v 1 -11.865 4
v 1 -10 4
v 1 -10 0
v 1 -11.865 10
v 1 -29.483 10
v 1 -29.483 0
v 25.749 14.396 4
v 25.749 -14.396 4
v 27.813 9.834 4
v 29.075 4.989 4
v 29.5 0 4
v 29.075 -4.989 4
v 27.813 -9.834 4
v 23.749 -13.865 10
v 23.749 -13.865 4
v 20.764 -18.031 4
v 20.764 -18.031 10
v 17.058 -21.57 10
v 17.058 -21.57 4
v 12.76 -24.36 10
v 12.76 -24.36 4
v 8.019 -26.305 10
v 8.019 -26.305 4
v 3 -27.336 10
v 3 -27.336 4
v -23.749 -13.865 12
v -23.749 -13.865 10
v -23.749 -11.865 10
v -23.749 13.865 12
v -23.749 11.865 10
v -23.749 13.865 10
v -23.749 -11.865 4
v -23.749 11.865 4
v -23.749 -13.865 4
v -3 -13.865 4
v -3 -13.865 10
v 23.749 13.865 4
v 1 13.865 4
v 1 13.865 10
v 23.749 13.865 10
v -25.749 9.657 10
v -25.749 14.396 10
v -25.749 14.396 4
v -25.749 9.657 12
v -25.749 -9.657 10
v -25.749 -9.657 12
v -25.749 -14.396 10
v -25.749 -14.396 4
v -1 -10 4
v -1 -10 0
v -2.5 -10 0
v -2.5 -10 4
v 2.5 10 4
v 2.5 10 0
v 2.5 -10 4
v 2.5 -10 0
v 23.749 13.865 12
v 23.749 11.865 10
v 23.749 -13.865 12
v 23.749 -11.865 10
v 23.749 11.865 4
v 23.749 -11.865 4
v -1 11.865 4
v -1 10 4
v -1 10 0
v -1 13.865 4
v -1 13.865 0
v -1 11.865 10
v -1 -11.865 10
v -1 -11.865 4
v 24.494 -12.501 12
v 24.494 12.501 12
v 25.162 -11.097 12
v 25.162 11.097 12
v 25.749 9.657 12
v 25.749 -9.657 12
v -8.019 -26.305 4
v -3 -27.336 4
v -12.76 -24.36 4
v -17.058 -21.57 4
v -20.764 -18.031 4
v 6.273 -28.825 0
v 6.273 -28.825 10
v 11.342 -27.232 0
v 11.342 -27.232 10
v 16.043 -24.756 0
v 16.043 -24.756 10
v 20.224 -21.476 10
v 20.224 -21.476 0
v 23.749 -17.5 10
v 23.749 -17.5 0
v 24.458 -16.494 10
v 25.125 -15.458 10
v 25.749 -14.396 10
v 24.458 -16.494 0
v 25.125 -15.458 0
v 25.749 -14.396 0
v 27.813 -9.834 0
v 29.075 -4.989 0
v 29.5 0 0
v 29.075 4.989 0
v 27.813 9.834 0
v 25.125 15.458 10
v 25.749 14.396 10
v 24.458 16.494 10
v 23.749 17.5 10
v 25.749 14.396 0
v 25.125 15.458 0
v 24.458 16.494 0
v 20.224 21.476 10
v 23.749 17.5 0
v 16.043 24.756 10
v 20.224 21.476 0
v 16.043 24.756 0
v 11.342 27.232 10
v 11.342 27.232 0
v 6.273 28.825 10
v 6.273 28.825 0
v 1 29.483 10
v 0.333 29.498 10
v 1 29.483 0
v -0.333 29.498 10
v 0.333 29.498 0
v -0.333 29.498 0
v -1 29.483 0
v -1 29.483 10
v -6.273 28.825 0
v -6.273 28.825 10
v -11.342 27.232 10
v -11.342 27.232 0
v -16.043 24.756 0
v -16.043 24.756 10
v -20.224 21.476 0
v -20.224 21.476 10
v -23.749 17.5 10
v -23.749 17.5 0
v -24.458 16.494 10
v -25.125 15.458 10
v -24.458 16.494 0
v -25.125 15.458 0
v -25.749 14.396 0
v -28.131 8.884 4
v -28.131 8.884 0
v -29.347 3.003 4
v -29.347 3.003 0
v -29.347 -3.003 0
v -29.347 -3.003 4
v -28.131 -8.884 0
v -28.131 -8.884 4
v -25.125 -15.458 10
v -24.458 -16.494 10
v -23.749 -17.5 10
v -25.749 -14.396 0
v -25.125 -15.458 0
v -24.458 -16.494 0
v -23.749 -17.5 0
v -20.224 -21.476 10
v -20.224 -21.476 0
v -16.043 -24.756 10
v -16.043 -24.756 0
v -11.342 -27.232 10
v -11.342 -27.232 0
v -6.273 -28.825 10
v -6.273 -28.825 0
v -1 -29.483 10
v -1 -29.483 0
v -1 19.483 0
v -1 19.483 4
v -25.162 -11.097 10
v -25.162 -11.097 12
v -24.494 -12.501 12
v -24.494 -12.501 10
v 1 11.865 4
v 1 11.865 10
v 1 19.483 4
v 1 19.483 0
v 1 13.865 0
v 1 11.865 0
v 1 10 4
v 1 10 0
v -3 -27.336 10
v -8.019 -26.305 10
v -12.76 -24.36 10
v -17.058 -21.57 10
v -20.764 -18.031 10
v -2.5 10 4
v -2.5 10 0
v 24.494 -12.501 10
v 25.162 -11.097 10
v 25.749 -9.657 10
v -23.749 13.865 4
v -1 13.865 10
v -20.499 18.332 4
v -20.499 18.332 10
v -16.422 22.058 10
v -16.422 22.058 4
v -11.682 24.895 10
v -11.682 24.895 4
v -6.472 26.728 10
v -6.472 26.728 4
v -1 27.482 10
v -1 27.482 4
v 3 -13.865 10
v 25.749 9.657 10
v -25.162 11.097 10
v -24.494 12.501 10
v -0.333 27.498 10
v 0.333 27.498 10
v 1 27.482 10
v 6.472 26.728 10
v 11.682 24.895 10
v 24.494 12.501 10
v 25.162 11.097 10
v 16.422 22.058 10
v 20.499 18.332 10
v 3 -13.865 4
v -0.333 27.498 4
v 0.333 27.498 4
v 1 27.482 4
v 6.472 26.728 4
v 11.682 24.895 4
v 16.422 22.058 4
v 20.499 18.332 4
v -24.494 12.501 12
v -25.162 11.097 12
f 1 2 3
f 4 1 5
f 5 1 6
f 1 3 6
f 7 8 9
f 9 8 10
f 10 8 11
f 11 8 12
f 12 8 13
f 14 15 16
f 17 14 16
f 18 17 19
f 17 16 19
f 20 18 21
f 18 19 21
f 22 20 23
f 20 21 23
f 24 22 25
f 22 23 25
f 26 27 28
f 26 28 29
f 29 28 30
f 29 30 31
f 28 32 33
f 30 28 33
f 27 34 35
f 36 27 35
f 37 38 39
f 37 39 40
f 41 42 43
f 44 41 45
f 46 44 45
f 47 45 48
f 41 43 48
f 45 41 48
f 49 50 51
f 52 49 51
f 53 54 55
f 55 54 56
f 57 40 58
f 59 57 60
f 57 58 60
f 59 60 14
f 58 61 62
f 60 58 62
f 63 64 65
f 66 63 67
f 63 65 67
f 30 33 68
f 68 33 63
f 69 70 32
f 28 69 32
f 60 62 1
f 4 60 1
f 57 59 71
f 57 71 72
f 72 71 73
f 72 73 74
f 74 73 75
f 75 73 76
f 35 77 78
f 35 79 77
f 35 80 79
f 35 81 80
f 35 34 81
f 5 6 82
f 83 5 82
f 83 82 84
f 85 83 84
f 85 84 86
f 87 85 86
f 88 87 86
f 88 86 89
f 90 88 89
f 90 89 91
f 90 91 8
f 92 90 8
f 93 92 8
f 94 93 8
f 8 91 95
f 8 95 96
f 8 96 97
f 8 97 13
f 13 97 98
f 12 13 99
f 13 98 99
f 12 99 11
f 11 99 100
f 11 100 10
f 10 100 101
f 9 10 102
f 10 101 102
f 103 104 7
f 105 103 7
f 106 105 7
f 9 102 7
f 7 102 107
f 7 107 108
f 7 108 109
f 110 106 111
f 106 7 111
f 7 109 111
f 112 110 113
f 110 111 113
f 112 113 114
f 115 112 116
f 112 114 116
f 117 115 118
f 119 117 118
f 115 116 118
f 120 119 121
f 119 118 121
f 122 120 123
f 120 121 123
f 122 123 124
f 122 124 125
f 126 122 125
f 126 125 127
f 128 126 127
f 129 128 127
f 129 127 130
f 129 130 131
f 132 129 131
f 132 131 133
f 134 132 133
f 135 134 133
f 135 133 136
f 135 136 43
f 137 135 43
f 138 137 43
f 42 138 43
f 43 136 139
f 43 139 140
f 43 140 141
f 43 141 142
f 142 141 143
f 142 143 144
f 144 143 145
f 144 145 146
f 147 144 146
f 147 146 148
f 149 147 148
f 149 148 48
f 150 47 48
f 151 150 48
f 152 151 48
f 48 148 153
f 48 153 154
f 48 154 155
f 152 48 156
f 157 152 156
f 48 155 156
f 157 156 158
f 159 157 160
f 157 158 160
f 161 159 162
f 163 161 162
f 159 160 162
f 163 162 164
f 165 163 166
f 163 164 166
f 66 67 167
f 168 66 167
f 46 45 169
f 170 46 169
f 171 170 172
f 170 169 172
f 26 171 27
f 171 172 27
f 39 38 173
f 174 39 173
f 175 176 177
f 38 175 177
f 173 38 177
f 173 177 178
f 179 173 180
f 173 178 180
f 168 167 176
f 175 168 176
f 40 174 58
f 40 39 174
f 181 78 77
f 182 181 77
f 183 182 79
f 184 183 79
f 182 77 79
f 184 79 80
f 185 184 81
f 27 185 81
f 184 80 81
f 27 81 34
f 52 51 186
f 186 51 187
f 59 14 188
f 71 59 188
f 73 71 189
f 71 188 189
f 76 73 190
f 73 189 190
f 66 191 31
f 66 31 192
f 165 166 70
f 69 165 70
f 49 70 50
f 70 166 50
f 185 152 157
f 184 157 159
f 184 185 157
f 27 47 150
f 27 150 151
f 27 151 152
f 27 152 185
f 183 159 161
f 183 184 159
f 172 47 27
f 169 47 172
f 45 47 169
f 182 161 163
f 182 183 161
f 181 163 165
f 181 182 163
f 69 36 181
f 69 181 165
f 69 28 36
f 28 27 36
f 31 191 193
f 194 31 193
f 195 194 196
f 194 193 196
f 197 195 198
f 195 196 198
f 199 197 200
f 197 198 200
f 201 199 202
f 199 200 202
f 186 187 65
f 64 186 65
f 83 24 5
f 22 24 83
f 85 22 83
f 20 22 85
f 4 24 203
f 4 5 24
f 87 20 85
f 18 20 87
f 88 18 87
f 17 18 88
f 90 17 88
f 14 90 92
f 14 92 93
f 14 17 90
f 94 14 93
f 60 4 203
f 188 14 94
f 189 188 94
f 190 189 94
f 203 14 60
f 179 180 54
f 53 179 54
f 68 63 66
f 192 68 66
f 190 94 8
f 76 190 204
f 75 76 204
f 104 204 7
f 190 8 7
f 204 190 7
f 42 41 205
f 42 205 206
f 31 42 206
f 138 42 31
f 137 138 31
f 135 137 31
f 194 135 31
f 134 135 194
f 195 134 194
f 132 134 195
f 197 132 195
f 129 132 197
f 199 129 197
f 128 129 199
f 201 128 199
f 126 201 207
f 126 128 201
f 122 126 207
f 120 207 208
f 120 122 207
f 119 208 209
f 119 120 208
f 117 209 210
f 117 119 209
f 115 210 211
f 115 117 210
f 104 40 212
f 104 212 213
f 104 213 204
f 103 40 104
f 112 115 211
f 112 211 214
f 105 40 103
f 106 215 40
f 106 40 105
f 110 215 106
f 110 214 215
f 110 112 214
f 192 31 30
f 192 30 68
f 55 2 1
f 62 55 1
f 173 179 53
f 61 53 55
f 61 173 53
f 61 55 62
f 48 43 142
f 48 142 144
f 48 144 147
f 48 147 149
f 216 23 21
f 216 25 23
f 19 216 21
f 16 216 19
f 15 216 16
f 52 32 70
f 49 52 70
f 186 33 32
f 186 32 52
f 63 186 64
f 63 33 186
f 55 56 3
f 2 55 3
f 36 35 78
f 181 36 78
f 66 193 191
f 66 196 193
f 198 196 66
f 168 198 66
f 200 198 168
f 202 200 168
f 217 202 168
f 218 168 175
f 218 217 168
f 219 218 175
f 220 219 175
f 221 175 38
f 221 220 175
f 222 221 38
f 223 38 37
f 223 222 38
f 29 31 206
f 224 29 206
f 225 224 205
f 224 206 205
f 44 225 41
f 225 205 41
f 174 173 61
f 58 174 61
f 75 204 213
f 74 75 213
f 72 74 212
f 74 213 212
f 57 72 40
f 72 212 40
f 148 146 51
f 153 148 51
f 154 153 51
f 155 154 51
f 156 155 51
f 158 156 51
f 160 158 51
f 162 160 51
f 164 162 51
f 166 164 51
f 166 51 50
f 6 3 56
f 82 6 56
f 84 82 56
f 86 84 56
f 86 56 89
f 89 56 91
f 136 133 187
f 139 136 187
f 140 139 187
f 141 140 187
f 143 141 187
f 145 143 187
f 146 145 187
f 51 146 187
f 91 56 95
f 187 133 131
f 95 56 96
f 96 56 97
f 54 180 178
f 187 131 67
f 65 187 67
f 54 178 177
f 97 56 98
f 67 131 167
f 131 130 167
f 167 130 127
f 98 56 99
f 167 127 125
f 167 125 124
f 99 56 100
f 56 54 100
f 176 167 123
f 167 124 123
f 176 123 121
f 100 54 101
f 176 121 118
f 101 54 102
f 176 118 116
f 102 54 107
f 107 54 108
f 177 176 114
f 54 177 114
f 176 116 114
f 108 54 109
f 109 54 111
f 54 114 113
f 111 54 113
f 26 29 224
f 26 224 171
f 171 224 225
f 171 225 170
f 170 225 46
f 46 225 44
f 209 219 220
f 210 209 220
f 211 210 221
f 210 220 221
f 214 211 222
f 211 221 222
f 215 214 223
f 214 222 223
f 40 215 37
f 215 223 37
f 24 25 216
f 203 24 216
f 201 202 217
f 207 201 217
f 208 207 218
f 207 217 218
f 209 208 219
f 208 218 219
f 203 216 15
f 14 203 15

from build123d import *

# Parameters (mm, degrees)
F0_W     = 22.7486841741
F0_H     = 2
F1_DEPTH = 4
F2_DEPTH = 12
F3_DEPTH = 10
F4_DEPTH = 10


with BuildPart() as f1:
    # F0 (on Top) → F1 (new body)
    with BuildSketch(Plane.XY):
        Polygon((-1, 10), (-1, 11.8654246239), (-23.7486841741, 11.8654246239), (-23.7486841741, -11.8654246239), (-1, -11.8654246239), (-1, -10), (-2.5, -10), (-2.5, 10), align=None)
        with BuildLine():
            Line((-23.7486841741, 11.8654246239), (-23.7486841741, 13.8654246239))
            ThreePointArc((-23.7486841741, 13.8654246239), (-24.8379817562, 11.8035868395), (-25.7486841741, 9.6568764776))
            Line((-25.7486841741, 9.6568764776), (-25.7486841741, -9.6568764776))
            ThreePointArc((-25.7486841741, -9.6568764776), (-24.8379817562, -11.8035868395), (-23.7486841741, -13.8654246239))
            Line((-23.7486841741, -13.8654246239), (-23.7486841741, -11.8654246239))
            Line((-23.7486841741, -11.8654246239), (-23.7486841741, 11.8654246239))
        make_face()
        with BuildLine():
            Line((-25.7486841741, -9.6568764776), (-25.7486841741, 9.6568764776))
            ThreePointArc((-25.7486841741, 9.6568764776), (-27.5, 0), (-25.7486841741, -9.6568764776))
        make_face()
        with BuildLine():
            Line((-25.7486841741, 9.6568764776), (-25.7486841741, 14.3963628498))
            ThreePointArc((-25.7486841741, 14.3963628498), (-29.5, 0), (-25.7486841741, -14.3963628498))
            Line((-25.7486841741, -14.3963628498), (-25.7486841741, -9.6568764776))
            ThreePointArc((-25.7486841741, -9.6568764776), (-27.5, 0), (-25.7486841741, 9.6568764776))
        make_face()
        with BuildLine():
            Line((-23.7486841741, 13.8654246239), (-23.7486841741, 17.5))
            ThreePointArc((-23.7486841741, 17.5), (-24.7972883445, 15.9795022063), (-25.7486841741, 14.3963628498))
            Line((-25.7486841741, 14.3963628498), (-25.7486841741, 9.6568764776))
            ThreePointArc((-25.7486841741, 9.6568764776), (-24.8379817562, 11.8035868395), (-23.7486841741, 13.8654246239))
        make_face()
        with BuildLine():
            Line((-1, 27.4818121673), (-1, 29.4830459756))
            ThreePointArc((-1, 29.4830459756), (-13.7485522802, 26.1003316109), (-23.7486841741, 17.5))
            Line((-23.7486841741, 17.5), (-23.7486841741, 13.8654246239))
            ThreePointArc((-23.7486841741, 13.8654246239), (-14.1235917712, 23.5960622876), (-1, 27.4818121673))
        make_face()
        with BuildLine():
            Line((-1, 19.4830459756), (-1, 27.4818121673))
            ThreePointArc((-1, 27.4818121673), (-14.1235917712, 23.5960622876), (-23.7486841741, 13.8654246239))
            Line((-23.7486841741, 13.8654246239), (-1, 13.8654246239))
            Line((-1, 13.8654246239), (-1, 19.4830459756))
        make_face()
        with Locations((-12.374342087, 12.8654246239)):
            Rectangle(F0_W, F0_H)
        with BuildLine():
            Line((23.7486841741, 13.8654246239), (23.7486841741, 17.5))
            ThreePointArc((23.7486841741, 17.5), (13.7485522802, 26.1003316109), (1, 29.4830459756))
            Line((1, 29.4830459756), (1, 27.4818121673))
            ThreePointArc((1, 27.4818121673), (14.1235917712, 23.5960622876), (23.7486841741, 13.8654246239))
        make_face()
        with BuildLine():
            Line((1, 27.4818121673), (1, 29.4830459756))
            ThreePointArc((1, 29.4830459756), (0, 29.5), (-1, 29.4830459756))
            Line((-1, 29.4830459756), (-1, 27.4818121673))
            ThreePointArc((-1, 27.4818121673), (0, 27.5), (1, 27.4818121673))
        make_face()
        with BuildLine():
            Line((1, 19.4830459756), (1, 27.4818121673))
            ThreePointArc((1, 27.4818121673), (0, 27.5), (-1, 27.4818121673))
            Line((-1, 27.4818121673), (-1, 19.4830459756))
            Line((-1, 19.4830459756), (1, 19.4830459756))
        make_face()
        with BuildLine():
            Line((1, 13.8654246239), (23.7486841741, 13.8654246239))
            ThreePointArc((23.7486841741, 13.8654246239), (14.1235917712, 23.5960622876), (1, 27.4818121673))
            Line((1, 27.4818121673), (1, 19.4830459756))
            Line((1, 19.4830459756), (1, 13.8654246239))
        make_face()
        with Locations((12.374342087, 12.8654246239)):
            Rectangle(F0_W, F0_H)
        Polygon((23.7486841741, -11.8654246239), (23.7486841741, 11.8654246239), (1, 11.8654246239), (1, 10), (2.5, 10), (2.5, -10), (1, -10), (1, -11.8654246239), align=None)
        Polygon((3, -13.8654246239), (23.7486841741, -13.8654246239), (23.7486841741, -11.8654246239), (1, -11.8654246239), (1, -13.8654246239), align=None)
        with BuildLine():
            ThreePointArc((3, -27.3358738657), (14.9745209257, -23.0654226721), (23.7486841741, -13.8654246239))
            Line((23.7486841741, -13.8654246239), (3, -13.8654246239))
            Line((3, -13.8654246239), (3, -27.3358738657))
        make_face()
        Polygon((-23.7486841741, -11.8654246239), (-23.7486841741, -13.8654246239), (-3, -13.8654246239), (-1, -13.8654246239), (-1, -11.8654246239), align=None)
        with BuildLine():
            Line((-3, -13.8654246239), (-23.7486841741, -13.8654246239))
            ThreePointArc((-23.7486841741, -13.8654246239), (-14.9745209257, -23.0654226721), (-3, -27.3358738657))
            Line((-3, -27.3358738657), (-3, -13.8654246239))
        make_face()
        with BuildLine():
            ThreePointArc((-23.7486841741, -17.5), (-13.7485522802, -26.1003316109), (-1, -29.4830459756))
            Line((-1, -29.4830459756), (-1, -27.4818121673))
            ThreePointArc((-1, -27.4818121673), (-2.0013306816, -27.4270792376), (-3, -27.3358738657))
            ThreePointArc((-3, -27.3358738657), (-14.9745209257, -23.0654226721), (-23.7486841741, -13.8654246239))
            Line((-23.7486841741, -13.8654246239), (-23.7486841741, -17.5))
        make_face()
        with BuildLine():
            ThreePointArc((-25.7486841741, -14.3963628498), (-24.7972883445, -15.9795022063), (-23.7486841741, -17.5))
            Line((-23.7486841741, -17.5), (-23.7486841741, -13.8654246239))
            ThreePointArc((-23.7486841741, -13.8654246239), (-24.8379817562, -11.8035868395), (-25.7486841741, -9.6568764776))
            Line((-25.7486841741, -9.6568764776), (-25.7486841741, -14.3963628498))
        make_face()
        with BuildLine():
            ThreePointArc((1, -29.4830459756), (13.7485522802, -26.1003316109), (23.7486841741, -17.5))
            Line((23.7486841741, -17.5), (23.7486841741, -13.8654246239))
            ThreePointArc((23.7486841741, -13.8654246239), (14.9745209257, -23.0654226721), (3, -27.3358738657))
            ThreePointArc((3, -27.3358738657), (2.0013306816, -27.4270792376), (1, -27.4818121673))
            Line((1, -27.4818121673), (1, -29.4830459756))
        make_face()
        with BuildLine():
            Line((25.7486841741, -9.6568764776), (25.7486841741, 9.6568764776))
            ThreePointArc((25.7486841741, 9.6568764776), (24.8379817562, 11.8035868395), (23.7486841741, 13.8654246239))
            Line((23.7486841741, 13.8654246239), (23.7486841741, 11.8654246239))
            Line((23.7486841741, 11.8654246239), (23.7486841741, -11.8654246239))
            Line((23.7486841741, -11.8654246239), (23.7486841741, -13.8654246239))
            ThreePointArc((23.7486841741, -13.8654246239), (24.8379817562, -11.8035868395), (25.7486841741, -9.6568764776))
        make_face()
        with BuildLine():
            ThreePointArc((27.5, 0), (27.0586290745, 4.9071980403), (25.7486841741, 9.6568764776))
            Line((25.7486841741, 9.6568764776), (25.7486841741, -9.6568764776))
            ThreePointArc((25.7486841741, -9.6568764776), (27.0586290745, -4.9071980403), (27.5, 0))
        make_face()
        with BuildLine():
            ThreePointArc((25.7486841741, -14.3963628498), (28.5467702476, -7.4385420905), (29.5, 0))
            ThreePointArc((29.5, 0), (28.5467702476, 7.4385420905), (25.7486841741, 14.3963628498))
            Line((25.7486841741, 14.3963628498), (25.7486841741, 9.6568764776))
            ThreePointArc((25.7486841741, 9.6568764776), (27.0586290745, 4.9071980403), (27.5, 0))
            ThreePointArc((27.5, 0), (27.0586290745, -4.9071980403), (25.7486841741, -9.6568764776))
            Line((25.7486841741, -9.6568764776), (25.7486841741, -14.3963628498))
        make_face()
        with BuildLine():
            Line((25.7486841741, 9.6568764776), (25.7486841741, 14.3963628498))
            ThreePointArc((25.7486841741, 14.3963628498), (24.7972883445, 15.9795022063), (23.7486841741, 17.5))
            Line((23.7486841741, 17.5), (23.7486841741, 13.8654246239))
            ThreePointArc((23.7486841741, 13.8654246239), (24.8379817562, 11.8035868395), (25.7486841741, 9.6568764776))
        make_face()
        with BuildLine():
            ThreePointArc((23.7486841741, -17.5), (24.7972883445, -15.9795022063), (25.7486841741, -14.3963628498))
            Line((25.7486841741, -14.3963628498), (25.7486841741, -9.6568764776))
            ThreePointArc((25.7486841741, -9.6568764776), (24.8379817562, -11.8035868395), (23.7486841741, -13.8654246239))
            Line((23.7486841741, -13.8654246239), (23.7486841741, -17.5))
        make_face()
        with BuildLine():
            ThreePointArc((-3, -27.3358738657), (-2.0013306816, -27.4270792376), (-1, -27.4818121673))
            Line((-1, -27.4818121673), (-1, -13.8654246239))
            Line((-1, -13.8654246239), (-3, -13.8654246239))
            Line((-3, -13.8654246239), (-3, -27.3358738657))
        make_face()
        with BuildLine():
            Line((1, -13.8654246239), (1, -27.4818121673))
            ThreePointArc((1, -27.4818121673), (2.0013306816, -27.4270792376), (3, -27.3358738657))
            Line((3, -27.3358738657), (3, -13.8654246239))
            Line((3, -13.8654246239), (1, -13.8654246239))
        make_face()
    extrude(amount=F1_DEPTH)

    # F0 (on Top) → F2 (join)
    with BuildSketch(Plane.XY):
        with BuildLine():
            Line((-23.7486841741, 11.8654246239), (-23.7486841741, 13.8654246239))
            ThreePointArc((-23.7486841741, 13.8654246239), (-24.8379817562, 11.8035868395), (-25.7486841741, 9.6568764776))
            Line((-25.7486841741, 9.6568764776), (-25.7486841741, -9.6568764776))
            ThreePointArc((-25.7486841741, -9.6568764776), (-24.8379817562, -11.8035868395), (-23.7486841741, -13.8654246239))
            Line((-23.7486841741, -13.8654246239), (-23.7486841741, -11.8654246239))
            Line((-23.7486841741, -11.8654246239), (-23.7486841741, 11.8654246239))
        make_face()
        with BuildLine():
            Line((25.7486841741, -9.6568764776), (25.7486841741, 9.6568764776))
            ThreePointArc((25.7486841741, 9.6568764776), (24.8379817562, 11.8035868395), (23.7486841741, 13.8654246239))
            Line((23.7486841741, 13.8654246239), (23.7486841741, 11.8654246239))
            Line((23.7486841741, 11.8654246239), (23.7486841741, -11.8654246239))
            Line((23.7486841741, -11.8654246239), (23.7486841741, -13.8654246239))
            ThreePointArc((23.7486841741, -13.8654246239), (24.8379817562, -11.8035868395), (25.7486841741, -9.6568764776))
        make_face()
    extrude(amount=F2_DEPTH)

    # F0 (on Top) → F3 (join)
    with BuildSketch(Plane.XY):
        with BuildLine():
            Line((-23.7486841741, 11.8654246239), (-23.7486841741, 13.8654246239))
            ThreePointArc((-23.7486841741, 13.8654246239), (-24.8379817562, 11.8035868395), (-25.7486841741, 9.6568764776))
            Line((-25.7486841741, 9.6568764776), (-25.7486841741, -9.6568764776))
            ThreePointArc((-25.7486841741, -9.6568764776), (-24.8379817562, -11.8035868395), (-23.7486841741, -13.8654246239))
            Line((-23.7486841741, -13.8654246239), (-23.7486841741, -11.8654246239))
            Line((-23.7486841741, -11.8654246239), (-23.7486841741, 11.8654246239))
        make_face()
        with BuildLine():
            ThreePointArc((-25.7486841741, -14.3963628498), (-24.7972883445, -15.9795022063), (-23.7486841741, -17.5))
            Line((-23.7486841741, -17.5), (-23.7486841741, -13.8654246239))
            ThreePointArc((-23.7486841741, -13.8654246239), (-24.8379817562, -11.8035868395), (-25.7486841741, -9.6568764776))
            Line((-25.7486841741, -9.6568764776), (-25.7486841741, -14.3963628498))
        make_face()
        with BuildLine():
            ThreePointArc((-23.7486841741, -17.5), (-13.7485522802, -26.1003316109), (-1, -29.4830459756))
            Line((-1, -29.4830459756), (-1, -27.4818121673))
            ThreePointArc((-1, -27.4818121673), (-2.0013306816, -27.4270792376), (-3, -27.3358738657))
            ThreePointArc((-3, -27.3358738657), (-14.9745209257, -23.0654226721), (-23.7486841741, -13.8654246239))
            Line((-23.7486841741, -13.8654246239), (-23.7486841741, -17.5))
        make_face()
        with BuildLine():
            ThreePointArc((-3, -27.3358738657), (-2.0013306816, -27.4270792376), (-1, -27.4818121673))
            Line((-1, -27.4818121673), (-1, -13.8654246239))
            Line((-1, -13.8654246239), (-3, -13.8654246239))
            Line((-3, -13.8654246239), (-3, -27.3358738657))
        make_face()
        Polygon((-23.7486841741, -11.8654246239), (-23.7486841741, -13.8654246239), (-3, -13.8654246239), (-1, -13.8654246239), (-1, -11.8654246239), align=None)
        Polygon((3, -13.8654246239), (23.7486841741, -13.8654246239), (23.7486841741, -11.8654246239), (1, -11.8654246239), (1, -13.8654246239), align=None)
        with BuildLine():
            Line((1, -13.8654246239), (1, -27.4818121673))
            ThreePointArc((1, -27.4818121673), (2.0013306816, -27.4270792376), (3, -27.3358738657))
            Line((3, -27.3358738657), (3, -13.8654246239))
            Line((3, -13.8654246239), (1, -13.8654246239))
        make_face()
        with BuildLine():
            ThreePointArc((1, -29.4830459756), (13.7485522802, -26.1003316109), (23.7486841741, -17.5))
            Line((23.7486841741, -17.5), (23.7486841741, -13.8654246239))
            ThreePointArc((23.7486841741, -13.8654246239), (14.9745209257, -23.0654226721), (3, -27.3358738657))
            ThreePointArc((3, -27.3358738657), (2.0013306816, -27.4270792376), (1, -27.4818121673))
            Line((1, -27.4818121673), (1, -29.4830459756))
        make_face()
        with BuildLine():
            Line((25.7486841741, -9.6568764776), (25.7486841741, 9.6568764776))
            ThreePointArc((25.7486841741, 9.6568764776), (24.8379817562, 11.8035868395), (23.7486841741, 13.8654246239))
            Line((23.7486841741, 13.8654246239), (23.7486841741, 11.8654246239))
            Line((23.7486841741, 11.8654246239), (23.7486841741, -11.8654246239))
            Line((23.7486841741, -11.8654246239), (23.7486841741, -13.8654246239))
            ThreePointArc((23.7486841741, -13.8654246239), (24.8379817562, -11.8035868395), (25.7486841741, -9.6568764776))
        make_face()
        with BuildLine():
            Line((25.7486841741, 9.6568764776), (25.7486841741, 14.3963628498))
            ThreePointArc((25.7486841741, 14.3963628498), (24.7972883445, 15.9795022063), (23.7486841741, 17.5))
            Line((23.7486841741, 17.5), (23.7486841741, 13.8654246239))
            ThreePointArc((23.7486841741, 13.8654246239), (24.8379817562, 11.8035868395), (25.7486841741, 9.6568764776))
        make_face()
        with BuildLine():
            ThreePointArc((23.7486841741, -17.5), (24.7972883445, -15.9795022063), (25.7486841741, -14.3963628498))
            Line((25.7486841741, -14.3963628498), (25.7486841741, -9.6568764776))
            ThreePointArc((25.7486841741, -9.6568764776), (24.8379817562, -11.8035868395), (23.7486841741, -13.8654246239))
            Line((23.7486841741, -13.8654246239), (23.7486841741, -17.5))
        make_face()
        with BuildLine():
            Line((23.7486841741, 13.8654246239), (23.7486841741, 17.5))
            ThreePointArc((23.7486841741, 17.5), (13.7485522802, 26.1003316109), (1, 29.4830459756))
            Line((1, 29.4830459756), (1, 27.4818121673))
            ThreePointArc((1, 27.4818121673), (14.1235917712, 23.5960622876), (23.7486841741, 13.8654246239))
        make_face()
        with BuildLine():
            Line((-1, 27.4818121673), (-1, 29.4830459756))
            ThreePointArc((-1, 29.4830459756), (-13.7485522802, 26.1003316109), (-23.7486841741, 17.5))
            Line((-23.7486841741, 17.5), (-23.7486841741, 13.8654246239))
            ThreePointArc((-23.7486841741, 13.8654246239), (-14.1235917712, 23.5960622876), (-1, 27.4818121673))
        make_face()
        with BuildLine():
            Line((-23.7486841741, 13.8654246239), (-23.7486841741, 17.5))
            ThreePointArc((-23.7486841741, 17.5), (-24.7972883445, 15.9795022063), (-25.7486841741, 14.3963628498))
            Line((-25.7486841741, 14.3963628498), (-25.7486841741, 9.6568764776))
            ThreePointArc((-25.7486841741, 9.6568764776), (-24.8379817562, 11.8035868395), (-23.7486841741, 13.8654246239))
        make_face()
        with Locations((-12.374342087, 12.8654246239)):
            Rectangle(F0_W, F0_H)
        with Locations((12.374342087, 12.8654246239)):
            Rectangle(F0_W, F0_H)
    extrude(amount=F3_DEPTH)

    # F0 (on Top) → F4 (join)
    with BuildSketch(Plane.XY):
        with BuildLine():
            Line((1, 27.4818121673), (1, 29.4830459756))
            ThreePointArc((1, 29.4830459756), (0, 29.5), (-1, 29.4830459756))
            Line((-1, 29.4830459756), (-1, 27.4818121673))
            ThreePointArc((-1, 27.4818121673), (0, 27.5), (1, 27.4818121673))
        make_face()
    extrude(amount=F4_DEPTH)


solid = f1.part
